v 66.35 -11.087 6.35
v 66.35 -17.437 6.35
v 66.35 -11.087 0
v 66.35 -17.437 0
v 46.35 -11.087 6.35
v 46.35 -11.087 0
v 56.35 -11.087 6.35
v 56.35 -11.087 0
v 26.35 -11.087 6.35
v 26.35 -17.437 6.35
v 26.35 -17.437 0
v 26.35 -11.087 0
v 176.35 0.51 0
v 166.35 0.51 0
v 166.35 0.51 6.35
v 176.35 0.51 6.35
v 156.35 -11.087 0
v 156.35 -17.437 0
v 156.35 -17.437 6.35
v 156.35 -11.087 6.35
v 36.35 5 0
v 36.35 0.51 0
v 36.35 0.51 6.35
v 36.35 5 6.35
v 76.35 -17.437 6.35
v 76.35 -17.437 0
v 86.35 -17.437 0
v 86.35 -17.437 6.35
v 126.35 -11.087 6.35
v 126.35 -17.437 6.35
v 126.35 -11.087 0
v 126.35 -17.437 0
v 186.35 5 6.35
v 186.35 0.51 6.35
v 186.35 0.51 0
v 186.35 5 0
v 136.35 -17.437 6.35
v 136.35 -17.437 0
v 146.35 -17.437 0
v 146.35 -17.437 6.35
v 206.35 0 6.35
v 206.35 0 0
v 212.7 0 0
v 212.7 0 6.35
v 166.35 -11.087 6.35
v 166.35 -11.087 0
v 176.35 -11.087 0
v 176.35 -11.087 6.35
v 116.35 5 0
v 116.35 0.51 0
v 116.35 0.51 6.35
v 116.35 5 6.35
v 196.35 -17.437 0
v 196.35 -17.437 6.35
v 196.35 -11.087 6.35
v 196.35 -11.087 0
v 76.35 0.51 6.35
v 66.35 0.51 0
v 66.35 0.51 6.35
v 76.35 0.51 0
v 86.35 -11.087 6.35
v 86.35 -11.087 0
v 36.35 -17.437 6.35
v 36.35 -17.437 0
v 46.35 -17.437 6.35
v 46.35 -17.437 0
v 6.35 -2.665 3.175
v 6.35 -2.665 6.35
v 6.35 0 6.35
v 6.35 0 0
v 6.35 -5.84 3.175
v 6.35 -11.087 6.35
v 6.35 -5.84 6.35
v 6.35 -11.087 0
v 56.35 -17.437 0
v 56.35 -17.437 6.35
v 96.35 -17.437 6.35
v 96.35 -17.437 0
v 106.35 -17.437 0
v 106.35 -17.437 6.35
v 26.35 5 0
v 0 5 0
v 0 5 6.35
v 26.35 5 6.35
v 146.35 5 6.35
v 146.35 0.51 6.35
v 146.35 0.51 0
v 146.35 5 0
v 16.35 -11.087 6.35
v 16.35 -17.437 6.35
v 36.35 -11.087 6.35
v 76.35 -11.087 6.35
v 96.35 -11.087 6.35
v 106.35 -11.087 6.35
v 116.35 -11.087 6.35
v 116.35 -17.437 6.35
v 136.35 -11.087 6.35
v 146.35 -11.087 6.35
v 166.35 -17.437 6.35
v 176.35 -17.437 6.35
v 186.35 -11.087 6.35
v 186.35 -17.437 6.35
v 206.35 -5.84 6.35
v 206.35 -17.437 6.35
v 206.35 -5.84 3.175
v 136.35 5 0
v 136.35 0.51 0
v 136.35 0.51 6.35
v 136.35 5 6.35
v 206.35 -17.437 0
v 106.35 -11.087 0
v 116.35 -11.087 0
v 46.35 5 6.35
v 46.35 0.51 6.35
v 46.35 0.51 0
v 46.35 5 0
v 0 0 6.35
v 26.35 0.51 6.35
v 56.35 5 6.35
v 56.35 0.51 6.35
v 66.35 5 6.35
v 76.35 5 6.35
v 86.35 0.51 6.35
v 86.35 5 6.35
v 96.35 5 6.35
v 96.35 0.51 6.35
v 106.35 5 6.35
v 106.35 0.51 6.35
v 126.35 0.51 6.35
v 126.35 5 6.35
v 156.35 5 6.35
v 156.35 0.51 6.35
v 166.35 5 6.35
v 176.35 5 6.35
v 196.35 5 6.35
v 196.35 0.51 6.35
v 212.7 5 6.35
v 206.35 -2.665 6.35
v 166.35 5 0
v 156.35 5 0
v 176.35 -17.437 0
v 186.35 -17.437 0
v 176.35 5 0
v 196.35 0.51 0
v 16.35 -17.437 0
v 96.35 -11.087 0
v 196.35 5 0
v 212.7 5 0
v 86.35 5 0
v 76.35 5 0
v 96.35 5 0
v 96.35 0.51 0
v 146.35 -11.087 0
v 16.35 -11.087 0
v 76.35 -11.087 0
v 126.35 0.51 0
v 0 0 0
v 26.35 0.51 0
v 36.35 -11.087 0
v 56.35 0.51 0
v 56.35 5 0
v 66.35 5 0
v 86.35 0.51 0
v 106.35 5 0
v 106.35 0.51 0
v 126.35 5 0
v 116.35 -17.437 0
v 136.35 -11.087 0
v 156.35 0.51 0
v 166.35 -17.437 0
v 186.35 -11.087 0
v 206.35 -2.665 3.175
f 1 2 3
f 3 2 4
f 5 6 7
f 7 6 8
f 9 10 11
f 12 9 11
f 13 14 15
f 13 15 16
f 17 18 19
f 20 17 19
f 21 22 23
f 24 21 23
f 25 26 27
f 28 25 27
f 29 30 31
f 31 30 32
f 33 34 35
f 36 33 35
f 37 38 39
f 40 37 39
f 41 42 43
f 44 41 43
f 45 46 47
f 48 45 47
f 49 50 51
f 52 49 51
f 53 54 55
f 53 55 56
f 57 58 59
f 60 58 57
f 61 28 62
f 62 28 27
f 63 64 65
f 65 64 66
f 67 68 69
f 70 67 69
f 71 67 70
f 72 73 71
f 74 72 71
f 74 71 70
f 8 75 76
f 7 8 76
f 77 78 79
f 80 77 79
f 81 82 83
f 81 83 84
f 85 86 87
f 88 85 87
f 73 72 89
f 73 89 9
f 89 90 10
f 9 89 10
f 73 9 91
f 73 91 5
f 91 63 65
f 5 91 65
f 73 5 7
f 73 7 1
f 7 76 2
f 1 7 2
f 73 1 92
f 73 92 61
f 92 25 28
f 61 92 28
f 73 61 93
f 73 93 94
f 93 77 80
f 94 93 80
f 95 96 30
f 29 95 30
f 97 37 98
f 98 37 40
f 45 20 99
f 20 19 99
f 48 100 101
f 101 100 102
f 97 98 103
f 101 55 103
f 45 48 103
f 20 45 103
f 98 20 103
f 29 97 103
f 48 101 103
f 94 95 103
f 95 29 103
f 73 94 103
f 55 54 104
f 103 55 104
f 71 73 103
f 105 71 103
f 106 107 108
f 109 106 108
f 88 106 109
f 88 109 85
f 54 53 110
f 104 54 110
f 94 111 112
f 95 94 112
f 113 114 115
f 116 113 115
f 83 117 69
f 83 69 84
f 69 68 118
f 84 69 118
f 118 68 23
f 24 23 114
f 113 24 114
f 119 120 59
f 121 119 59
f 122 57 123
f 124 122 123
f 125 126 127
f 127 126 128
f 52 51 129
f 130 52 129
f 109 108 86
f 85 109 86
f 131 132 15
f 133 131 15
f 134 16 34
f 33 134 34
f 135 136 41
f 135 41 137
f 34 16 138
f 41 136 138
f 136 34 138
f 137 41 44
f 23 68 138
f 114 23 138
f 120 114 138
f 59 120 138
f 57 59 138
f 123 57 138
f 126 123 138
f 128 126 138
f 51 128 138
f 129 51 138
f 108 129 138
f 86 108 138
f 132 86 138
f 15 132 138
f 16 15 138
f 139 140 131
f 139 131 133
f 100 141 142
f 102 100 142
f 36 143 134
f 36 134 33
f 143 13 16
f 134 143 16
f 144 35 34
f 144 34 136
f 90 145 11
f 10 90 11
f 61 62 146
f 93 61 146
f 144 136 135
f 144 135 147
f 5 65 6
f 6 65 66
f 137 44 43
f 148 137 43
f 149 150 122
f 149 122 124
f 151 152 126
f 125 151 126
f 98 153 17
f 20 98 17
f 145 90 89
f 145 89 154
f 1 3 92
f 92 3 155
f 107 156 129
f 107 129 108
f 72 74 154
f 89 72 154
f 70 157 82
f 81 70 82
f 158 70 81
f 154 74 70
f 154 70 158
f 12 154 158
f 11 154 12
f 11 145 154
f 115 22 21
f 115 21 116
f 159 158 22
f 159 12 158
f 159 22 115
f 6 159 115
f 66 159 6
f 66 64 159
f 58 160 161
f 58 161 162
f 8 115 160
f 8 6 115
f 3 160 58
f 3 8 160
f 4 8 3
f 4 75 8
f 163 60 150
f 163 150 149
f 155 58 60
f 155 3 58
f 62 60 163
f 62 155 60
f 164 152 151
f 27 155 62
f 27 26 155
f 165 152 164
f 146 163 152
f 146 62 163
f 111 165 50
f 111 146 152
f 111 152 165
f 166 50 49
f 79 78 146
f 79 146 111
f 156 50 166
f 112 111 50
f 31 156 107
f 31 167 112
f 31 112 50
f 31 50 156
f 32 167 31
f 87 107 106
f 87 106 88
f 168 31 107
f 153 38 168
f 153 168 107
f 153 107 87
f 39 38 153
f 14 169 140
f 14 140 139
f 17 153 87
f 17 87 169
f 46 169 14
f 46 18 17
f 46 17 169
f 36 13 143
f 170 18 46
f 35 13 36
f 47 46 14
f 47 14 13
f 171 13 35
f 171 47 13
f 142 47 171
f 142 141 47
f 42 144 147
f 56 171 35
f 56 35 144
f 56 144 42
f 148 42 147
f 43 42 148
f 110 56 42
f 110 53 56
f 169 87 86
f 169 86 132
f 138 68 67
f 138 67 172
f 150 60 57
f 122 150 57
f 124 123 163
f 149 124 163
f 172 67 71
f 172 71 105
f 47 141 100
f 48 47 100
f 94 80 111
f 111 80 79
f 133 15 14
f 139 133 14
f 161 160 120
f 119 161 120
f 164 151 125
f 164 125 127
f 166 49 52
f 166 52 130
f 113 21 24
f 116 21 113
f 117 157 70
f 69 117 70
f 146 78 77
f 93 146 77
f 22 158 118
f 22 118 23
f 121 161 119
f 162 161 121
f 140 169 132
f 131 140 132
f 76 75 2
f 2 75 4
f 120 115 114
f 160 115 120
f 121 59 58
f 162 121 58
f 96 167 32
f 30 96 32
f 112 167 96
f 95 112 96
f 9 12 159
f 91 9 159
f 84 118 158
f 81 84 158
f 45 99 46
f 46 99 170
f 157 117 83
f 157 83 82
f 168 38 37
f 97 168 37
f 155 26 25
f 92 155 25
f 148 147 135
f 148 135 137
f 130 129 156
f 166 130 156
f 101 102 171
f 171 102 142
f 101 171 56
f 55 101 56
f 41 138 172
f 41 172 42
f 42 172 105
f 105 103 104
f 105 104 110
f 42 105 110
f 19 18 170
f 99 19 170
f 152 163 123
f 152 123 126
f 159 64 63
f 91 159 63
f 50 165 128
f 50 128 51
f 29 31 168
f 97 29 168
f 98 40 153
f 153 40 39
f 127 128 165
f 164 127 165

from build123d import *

# Parameters (mm, degrees)
BOSS_EXTRUDE1_START         = -11.086796564
BOSS_EXTRUDE1_OUTLINE_W     = 199.999998902
BOSS_EXTRUDE1_OUTLINE_H     = 6.35
BOSS_EXTRUDE1_DEPTH         = 11.596668503
BOSS_EXTRUDE1_START_2       = -17.436796564
BOSS_EXTRUDE1_2_OUTLINE_W   = 10
BOSS_EXTRUDE1_2_OUTLINE_H   = 6.35
BOSS_EXTRUDE1_2_OUTLINE_W_2 = 9.999999878
BOSS_EXTRUDE1_2_DEPTH       = 22.436796492
BOSS_EXTRUDE1_3_OUTLINE_W   = 16.35
BOSS_EXTRUDE1_3_OUTLINE_H   = 6.35
BOSS_EXTRUDE1_3_DEPTH       = 4.999999928
SKETCH2_W                   = 199.999998902
SKETCH2_H                   = 3.175
CUT_EXTRUDE1_DEPTH          = 3.175


# Read off the part's stored shape, not the designer's step: Boss-Extrude1
with BuildPart() as part:
    # Boss-Extrude1 outline → Boss-Extrude1 (new body)
    with BuildSketch(Plane(origin=(0, 0, 0), x_dir=(1, 0, 0), z_dir=(0, 1, 0)).offset(BOSS_EXTRUDE1_START)):
        with Locations((106.349999451, -3.175)):
            Rectangle(BOSS_EXTRUDE1_OUTLINE_W, BOSS_EXTRUDE1_OUTLINE_H)
    extrude(amount=BOSS_EXTRUDE1_DEPTH)



with BuildPart() as body_2:
    # Boss-Extrude1 2 outline → Boss-Extrude1 2 (new body)
    with BuildSketch(Plane(origin=(0, 0, 0), x_dir=(1, 0, 0), z_dir=(0, 1, 0)).offset(BOSS_EXTRUDE1_START_2)):
        Polygon((76.349999756, 0), (76.349999756, -6.35), (86.349999688, -6.35), (86.349999634, 0), align=None)
        Polygon((56.349999878, -6.35), (66.349999811, -6.35), (66.349999865, 0), (56.349999878, 0), align=None)
        Polygon((96.349999634, 0), (96.349999634, -6.35), (106.349999567, -6.35), (106.349999512, 0), align=None)
        Polygon((36.35, -6.35), (46.349999932, -6.35), (46.349999987, 0), (36.35, 0), align=None)
        Polygon((116.349999512, 0), (116.349999512, -6.35), (126.349999444, -6.35), (126.34999939, 0), align=None)
        with Locations((21.35, -3.175)):
            Rectangle(BOSS_EXTRUDE1_2_OUTLINE_W, BOSS_EXTRUDE1_2_OUTLINE_H)
        Polygon((136.34999939, 0), (136.34999939, -6.35), (146.349999322, -6.35), (146.349999268, 0), align=None)
        Polygon((156.349999268, 0), (156.349999268, -6.35), (166.349999201, -6.35), (166.349999146, 0), align=None)
        Polygon((176.349999146, 0), (176.349999146, -6.35), (186.349999078, -6.35), (186.349999024, 0), align=None)
        with Locations((201.349998963, -3.175)):
            Rectangle(BOSS_EXTRUDE1_2_OUTLINE_W_2, BOSS_EXTRUDE1_2_OUTLINE_H)
    extrude(amount=BOSS_EXTRUDE1_2_DEPTH)


with BuildPart() as part_1:
    add(part.part)

    add(body_2.part)  # Boss-Extrude1 3 merges body 2
    # Boss-Extrude1 3 outline → Boss-Extrude1 3 (add)
    with BuildSketch(Plane(origin=(0, 0, 0), x_dir=(1, 0, 0), z_dir=(0, 1, 0))):
        with Locations((8.175, -3.175)):
            Rectangle(BOSS_EXTRUDE1_3_OUTLINE_W, BOSS_EXTRUDE1_3_OUTLINE_H)
        Polygon((206.349998902, 0), (206.349998902, -6.35), (212.699998902, -6.35), (212.699998619, 0), align=None)
    extrude(amount=BOSS_EXTRUDE1_3_DEPTH)

    # Sketch2 → Cut-Extrude1 (cut)
    with BuildSketch(Plane.XY.offset(6.35)):
        with Locations((106.349999451, -4.252628114)):
            Rectangle(SKETCH2_W, SKETCH2_H)
    extrude(amount=-CUT_EXTRUDE1_DEPTH, mode=Mode.SUBTRACT)


solid = part_1.part
